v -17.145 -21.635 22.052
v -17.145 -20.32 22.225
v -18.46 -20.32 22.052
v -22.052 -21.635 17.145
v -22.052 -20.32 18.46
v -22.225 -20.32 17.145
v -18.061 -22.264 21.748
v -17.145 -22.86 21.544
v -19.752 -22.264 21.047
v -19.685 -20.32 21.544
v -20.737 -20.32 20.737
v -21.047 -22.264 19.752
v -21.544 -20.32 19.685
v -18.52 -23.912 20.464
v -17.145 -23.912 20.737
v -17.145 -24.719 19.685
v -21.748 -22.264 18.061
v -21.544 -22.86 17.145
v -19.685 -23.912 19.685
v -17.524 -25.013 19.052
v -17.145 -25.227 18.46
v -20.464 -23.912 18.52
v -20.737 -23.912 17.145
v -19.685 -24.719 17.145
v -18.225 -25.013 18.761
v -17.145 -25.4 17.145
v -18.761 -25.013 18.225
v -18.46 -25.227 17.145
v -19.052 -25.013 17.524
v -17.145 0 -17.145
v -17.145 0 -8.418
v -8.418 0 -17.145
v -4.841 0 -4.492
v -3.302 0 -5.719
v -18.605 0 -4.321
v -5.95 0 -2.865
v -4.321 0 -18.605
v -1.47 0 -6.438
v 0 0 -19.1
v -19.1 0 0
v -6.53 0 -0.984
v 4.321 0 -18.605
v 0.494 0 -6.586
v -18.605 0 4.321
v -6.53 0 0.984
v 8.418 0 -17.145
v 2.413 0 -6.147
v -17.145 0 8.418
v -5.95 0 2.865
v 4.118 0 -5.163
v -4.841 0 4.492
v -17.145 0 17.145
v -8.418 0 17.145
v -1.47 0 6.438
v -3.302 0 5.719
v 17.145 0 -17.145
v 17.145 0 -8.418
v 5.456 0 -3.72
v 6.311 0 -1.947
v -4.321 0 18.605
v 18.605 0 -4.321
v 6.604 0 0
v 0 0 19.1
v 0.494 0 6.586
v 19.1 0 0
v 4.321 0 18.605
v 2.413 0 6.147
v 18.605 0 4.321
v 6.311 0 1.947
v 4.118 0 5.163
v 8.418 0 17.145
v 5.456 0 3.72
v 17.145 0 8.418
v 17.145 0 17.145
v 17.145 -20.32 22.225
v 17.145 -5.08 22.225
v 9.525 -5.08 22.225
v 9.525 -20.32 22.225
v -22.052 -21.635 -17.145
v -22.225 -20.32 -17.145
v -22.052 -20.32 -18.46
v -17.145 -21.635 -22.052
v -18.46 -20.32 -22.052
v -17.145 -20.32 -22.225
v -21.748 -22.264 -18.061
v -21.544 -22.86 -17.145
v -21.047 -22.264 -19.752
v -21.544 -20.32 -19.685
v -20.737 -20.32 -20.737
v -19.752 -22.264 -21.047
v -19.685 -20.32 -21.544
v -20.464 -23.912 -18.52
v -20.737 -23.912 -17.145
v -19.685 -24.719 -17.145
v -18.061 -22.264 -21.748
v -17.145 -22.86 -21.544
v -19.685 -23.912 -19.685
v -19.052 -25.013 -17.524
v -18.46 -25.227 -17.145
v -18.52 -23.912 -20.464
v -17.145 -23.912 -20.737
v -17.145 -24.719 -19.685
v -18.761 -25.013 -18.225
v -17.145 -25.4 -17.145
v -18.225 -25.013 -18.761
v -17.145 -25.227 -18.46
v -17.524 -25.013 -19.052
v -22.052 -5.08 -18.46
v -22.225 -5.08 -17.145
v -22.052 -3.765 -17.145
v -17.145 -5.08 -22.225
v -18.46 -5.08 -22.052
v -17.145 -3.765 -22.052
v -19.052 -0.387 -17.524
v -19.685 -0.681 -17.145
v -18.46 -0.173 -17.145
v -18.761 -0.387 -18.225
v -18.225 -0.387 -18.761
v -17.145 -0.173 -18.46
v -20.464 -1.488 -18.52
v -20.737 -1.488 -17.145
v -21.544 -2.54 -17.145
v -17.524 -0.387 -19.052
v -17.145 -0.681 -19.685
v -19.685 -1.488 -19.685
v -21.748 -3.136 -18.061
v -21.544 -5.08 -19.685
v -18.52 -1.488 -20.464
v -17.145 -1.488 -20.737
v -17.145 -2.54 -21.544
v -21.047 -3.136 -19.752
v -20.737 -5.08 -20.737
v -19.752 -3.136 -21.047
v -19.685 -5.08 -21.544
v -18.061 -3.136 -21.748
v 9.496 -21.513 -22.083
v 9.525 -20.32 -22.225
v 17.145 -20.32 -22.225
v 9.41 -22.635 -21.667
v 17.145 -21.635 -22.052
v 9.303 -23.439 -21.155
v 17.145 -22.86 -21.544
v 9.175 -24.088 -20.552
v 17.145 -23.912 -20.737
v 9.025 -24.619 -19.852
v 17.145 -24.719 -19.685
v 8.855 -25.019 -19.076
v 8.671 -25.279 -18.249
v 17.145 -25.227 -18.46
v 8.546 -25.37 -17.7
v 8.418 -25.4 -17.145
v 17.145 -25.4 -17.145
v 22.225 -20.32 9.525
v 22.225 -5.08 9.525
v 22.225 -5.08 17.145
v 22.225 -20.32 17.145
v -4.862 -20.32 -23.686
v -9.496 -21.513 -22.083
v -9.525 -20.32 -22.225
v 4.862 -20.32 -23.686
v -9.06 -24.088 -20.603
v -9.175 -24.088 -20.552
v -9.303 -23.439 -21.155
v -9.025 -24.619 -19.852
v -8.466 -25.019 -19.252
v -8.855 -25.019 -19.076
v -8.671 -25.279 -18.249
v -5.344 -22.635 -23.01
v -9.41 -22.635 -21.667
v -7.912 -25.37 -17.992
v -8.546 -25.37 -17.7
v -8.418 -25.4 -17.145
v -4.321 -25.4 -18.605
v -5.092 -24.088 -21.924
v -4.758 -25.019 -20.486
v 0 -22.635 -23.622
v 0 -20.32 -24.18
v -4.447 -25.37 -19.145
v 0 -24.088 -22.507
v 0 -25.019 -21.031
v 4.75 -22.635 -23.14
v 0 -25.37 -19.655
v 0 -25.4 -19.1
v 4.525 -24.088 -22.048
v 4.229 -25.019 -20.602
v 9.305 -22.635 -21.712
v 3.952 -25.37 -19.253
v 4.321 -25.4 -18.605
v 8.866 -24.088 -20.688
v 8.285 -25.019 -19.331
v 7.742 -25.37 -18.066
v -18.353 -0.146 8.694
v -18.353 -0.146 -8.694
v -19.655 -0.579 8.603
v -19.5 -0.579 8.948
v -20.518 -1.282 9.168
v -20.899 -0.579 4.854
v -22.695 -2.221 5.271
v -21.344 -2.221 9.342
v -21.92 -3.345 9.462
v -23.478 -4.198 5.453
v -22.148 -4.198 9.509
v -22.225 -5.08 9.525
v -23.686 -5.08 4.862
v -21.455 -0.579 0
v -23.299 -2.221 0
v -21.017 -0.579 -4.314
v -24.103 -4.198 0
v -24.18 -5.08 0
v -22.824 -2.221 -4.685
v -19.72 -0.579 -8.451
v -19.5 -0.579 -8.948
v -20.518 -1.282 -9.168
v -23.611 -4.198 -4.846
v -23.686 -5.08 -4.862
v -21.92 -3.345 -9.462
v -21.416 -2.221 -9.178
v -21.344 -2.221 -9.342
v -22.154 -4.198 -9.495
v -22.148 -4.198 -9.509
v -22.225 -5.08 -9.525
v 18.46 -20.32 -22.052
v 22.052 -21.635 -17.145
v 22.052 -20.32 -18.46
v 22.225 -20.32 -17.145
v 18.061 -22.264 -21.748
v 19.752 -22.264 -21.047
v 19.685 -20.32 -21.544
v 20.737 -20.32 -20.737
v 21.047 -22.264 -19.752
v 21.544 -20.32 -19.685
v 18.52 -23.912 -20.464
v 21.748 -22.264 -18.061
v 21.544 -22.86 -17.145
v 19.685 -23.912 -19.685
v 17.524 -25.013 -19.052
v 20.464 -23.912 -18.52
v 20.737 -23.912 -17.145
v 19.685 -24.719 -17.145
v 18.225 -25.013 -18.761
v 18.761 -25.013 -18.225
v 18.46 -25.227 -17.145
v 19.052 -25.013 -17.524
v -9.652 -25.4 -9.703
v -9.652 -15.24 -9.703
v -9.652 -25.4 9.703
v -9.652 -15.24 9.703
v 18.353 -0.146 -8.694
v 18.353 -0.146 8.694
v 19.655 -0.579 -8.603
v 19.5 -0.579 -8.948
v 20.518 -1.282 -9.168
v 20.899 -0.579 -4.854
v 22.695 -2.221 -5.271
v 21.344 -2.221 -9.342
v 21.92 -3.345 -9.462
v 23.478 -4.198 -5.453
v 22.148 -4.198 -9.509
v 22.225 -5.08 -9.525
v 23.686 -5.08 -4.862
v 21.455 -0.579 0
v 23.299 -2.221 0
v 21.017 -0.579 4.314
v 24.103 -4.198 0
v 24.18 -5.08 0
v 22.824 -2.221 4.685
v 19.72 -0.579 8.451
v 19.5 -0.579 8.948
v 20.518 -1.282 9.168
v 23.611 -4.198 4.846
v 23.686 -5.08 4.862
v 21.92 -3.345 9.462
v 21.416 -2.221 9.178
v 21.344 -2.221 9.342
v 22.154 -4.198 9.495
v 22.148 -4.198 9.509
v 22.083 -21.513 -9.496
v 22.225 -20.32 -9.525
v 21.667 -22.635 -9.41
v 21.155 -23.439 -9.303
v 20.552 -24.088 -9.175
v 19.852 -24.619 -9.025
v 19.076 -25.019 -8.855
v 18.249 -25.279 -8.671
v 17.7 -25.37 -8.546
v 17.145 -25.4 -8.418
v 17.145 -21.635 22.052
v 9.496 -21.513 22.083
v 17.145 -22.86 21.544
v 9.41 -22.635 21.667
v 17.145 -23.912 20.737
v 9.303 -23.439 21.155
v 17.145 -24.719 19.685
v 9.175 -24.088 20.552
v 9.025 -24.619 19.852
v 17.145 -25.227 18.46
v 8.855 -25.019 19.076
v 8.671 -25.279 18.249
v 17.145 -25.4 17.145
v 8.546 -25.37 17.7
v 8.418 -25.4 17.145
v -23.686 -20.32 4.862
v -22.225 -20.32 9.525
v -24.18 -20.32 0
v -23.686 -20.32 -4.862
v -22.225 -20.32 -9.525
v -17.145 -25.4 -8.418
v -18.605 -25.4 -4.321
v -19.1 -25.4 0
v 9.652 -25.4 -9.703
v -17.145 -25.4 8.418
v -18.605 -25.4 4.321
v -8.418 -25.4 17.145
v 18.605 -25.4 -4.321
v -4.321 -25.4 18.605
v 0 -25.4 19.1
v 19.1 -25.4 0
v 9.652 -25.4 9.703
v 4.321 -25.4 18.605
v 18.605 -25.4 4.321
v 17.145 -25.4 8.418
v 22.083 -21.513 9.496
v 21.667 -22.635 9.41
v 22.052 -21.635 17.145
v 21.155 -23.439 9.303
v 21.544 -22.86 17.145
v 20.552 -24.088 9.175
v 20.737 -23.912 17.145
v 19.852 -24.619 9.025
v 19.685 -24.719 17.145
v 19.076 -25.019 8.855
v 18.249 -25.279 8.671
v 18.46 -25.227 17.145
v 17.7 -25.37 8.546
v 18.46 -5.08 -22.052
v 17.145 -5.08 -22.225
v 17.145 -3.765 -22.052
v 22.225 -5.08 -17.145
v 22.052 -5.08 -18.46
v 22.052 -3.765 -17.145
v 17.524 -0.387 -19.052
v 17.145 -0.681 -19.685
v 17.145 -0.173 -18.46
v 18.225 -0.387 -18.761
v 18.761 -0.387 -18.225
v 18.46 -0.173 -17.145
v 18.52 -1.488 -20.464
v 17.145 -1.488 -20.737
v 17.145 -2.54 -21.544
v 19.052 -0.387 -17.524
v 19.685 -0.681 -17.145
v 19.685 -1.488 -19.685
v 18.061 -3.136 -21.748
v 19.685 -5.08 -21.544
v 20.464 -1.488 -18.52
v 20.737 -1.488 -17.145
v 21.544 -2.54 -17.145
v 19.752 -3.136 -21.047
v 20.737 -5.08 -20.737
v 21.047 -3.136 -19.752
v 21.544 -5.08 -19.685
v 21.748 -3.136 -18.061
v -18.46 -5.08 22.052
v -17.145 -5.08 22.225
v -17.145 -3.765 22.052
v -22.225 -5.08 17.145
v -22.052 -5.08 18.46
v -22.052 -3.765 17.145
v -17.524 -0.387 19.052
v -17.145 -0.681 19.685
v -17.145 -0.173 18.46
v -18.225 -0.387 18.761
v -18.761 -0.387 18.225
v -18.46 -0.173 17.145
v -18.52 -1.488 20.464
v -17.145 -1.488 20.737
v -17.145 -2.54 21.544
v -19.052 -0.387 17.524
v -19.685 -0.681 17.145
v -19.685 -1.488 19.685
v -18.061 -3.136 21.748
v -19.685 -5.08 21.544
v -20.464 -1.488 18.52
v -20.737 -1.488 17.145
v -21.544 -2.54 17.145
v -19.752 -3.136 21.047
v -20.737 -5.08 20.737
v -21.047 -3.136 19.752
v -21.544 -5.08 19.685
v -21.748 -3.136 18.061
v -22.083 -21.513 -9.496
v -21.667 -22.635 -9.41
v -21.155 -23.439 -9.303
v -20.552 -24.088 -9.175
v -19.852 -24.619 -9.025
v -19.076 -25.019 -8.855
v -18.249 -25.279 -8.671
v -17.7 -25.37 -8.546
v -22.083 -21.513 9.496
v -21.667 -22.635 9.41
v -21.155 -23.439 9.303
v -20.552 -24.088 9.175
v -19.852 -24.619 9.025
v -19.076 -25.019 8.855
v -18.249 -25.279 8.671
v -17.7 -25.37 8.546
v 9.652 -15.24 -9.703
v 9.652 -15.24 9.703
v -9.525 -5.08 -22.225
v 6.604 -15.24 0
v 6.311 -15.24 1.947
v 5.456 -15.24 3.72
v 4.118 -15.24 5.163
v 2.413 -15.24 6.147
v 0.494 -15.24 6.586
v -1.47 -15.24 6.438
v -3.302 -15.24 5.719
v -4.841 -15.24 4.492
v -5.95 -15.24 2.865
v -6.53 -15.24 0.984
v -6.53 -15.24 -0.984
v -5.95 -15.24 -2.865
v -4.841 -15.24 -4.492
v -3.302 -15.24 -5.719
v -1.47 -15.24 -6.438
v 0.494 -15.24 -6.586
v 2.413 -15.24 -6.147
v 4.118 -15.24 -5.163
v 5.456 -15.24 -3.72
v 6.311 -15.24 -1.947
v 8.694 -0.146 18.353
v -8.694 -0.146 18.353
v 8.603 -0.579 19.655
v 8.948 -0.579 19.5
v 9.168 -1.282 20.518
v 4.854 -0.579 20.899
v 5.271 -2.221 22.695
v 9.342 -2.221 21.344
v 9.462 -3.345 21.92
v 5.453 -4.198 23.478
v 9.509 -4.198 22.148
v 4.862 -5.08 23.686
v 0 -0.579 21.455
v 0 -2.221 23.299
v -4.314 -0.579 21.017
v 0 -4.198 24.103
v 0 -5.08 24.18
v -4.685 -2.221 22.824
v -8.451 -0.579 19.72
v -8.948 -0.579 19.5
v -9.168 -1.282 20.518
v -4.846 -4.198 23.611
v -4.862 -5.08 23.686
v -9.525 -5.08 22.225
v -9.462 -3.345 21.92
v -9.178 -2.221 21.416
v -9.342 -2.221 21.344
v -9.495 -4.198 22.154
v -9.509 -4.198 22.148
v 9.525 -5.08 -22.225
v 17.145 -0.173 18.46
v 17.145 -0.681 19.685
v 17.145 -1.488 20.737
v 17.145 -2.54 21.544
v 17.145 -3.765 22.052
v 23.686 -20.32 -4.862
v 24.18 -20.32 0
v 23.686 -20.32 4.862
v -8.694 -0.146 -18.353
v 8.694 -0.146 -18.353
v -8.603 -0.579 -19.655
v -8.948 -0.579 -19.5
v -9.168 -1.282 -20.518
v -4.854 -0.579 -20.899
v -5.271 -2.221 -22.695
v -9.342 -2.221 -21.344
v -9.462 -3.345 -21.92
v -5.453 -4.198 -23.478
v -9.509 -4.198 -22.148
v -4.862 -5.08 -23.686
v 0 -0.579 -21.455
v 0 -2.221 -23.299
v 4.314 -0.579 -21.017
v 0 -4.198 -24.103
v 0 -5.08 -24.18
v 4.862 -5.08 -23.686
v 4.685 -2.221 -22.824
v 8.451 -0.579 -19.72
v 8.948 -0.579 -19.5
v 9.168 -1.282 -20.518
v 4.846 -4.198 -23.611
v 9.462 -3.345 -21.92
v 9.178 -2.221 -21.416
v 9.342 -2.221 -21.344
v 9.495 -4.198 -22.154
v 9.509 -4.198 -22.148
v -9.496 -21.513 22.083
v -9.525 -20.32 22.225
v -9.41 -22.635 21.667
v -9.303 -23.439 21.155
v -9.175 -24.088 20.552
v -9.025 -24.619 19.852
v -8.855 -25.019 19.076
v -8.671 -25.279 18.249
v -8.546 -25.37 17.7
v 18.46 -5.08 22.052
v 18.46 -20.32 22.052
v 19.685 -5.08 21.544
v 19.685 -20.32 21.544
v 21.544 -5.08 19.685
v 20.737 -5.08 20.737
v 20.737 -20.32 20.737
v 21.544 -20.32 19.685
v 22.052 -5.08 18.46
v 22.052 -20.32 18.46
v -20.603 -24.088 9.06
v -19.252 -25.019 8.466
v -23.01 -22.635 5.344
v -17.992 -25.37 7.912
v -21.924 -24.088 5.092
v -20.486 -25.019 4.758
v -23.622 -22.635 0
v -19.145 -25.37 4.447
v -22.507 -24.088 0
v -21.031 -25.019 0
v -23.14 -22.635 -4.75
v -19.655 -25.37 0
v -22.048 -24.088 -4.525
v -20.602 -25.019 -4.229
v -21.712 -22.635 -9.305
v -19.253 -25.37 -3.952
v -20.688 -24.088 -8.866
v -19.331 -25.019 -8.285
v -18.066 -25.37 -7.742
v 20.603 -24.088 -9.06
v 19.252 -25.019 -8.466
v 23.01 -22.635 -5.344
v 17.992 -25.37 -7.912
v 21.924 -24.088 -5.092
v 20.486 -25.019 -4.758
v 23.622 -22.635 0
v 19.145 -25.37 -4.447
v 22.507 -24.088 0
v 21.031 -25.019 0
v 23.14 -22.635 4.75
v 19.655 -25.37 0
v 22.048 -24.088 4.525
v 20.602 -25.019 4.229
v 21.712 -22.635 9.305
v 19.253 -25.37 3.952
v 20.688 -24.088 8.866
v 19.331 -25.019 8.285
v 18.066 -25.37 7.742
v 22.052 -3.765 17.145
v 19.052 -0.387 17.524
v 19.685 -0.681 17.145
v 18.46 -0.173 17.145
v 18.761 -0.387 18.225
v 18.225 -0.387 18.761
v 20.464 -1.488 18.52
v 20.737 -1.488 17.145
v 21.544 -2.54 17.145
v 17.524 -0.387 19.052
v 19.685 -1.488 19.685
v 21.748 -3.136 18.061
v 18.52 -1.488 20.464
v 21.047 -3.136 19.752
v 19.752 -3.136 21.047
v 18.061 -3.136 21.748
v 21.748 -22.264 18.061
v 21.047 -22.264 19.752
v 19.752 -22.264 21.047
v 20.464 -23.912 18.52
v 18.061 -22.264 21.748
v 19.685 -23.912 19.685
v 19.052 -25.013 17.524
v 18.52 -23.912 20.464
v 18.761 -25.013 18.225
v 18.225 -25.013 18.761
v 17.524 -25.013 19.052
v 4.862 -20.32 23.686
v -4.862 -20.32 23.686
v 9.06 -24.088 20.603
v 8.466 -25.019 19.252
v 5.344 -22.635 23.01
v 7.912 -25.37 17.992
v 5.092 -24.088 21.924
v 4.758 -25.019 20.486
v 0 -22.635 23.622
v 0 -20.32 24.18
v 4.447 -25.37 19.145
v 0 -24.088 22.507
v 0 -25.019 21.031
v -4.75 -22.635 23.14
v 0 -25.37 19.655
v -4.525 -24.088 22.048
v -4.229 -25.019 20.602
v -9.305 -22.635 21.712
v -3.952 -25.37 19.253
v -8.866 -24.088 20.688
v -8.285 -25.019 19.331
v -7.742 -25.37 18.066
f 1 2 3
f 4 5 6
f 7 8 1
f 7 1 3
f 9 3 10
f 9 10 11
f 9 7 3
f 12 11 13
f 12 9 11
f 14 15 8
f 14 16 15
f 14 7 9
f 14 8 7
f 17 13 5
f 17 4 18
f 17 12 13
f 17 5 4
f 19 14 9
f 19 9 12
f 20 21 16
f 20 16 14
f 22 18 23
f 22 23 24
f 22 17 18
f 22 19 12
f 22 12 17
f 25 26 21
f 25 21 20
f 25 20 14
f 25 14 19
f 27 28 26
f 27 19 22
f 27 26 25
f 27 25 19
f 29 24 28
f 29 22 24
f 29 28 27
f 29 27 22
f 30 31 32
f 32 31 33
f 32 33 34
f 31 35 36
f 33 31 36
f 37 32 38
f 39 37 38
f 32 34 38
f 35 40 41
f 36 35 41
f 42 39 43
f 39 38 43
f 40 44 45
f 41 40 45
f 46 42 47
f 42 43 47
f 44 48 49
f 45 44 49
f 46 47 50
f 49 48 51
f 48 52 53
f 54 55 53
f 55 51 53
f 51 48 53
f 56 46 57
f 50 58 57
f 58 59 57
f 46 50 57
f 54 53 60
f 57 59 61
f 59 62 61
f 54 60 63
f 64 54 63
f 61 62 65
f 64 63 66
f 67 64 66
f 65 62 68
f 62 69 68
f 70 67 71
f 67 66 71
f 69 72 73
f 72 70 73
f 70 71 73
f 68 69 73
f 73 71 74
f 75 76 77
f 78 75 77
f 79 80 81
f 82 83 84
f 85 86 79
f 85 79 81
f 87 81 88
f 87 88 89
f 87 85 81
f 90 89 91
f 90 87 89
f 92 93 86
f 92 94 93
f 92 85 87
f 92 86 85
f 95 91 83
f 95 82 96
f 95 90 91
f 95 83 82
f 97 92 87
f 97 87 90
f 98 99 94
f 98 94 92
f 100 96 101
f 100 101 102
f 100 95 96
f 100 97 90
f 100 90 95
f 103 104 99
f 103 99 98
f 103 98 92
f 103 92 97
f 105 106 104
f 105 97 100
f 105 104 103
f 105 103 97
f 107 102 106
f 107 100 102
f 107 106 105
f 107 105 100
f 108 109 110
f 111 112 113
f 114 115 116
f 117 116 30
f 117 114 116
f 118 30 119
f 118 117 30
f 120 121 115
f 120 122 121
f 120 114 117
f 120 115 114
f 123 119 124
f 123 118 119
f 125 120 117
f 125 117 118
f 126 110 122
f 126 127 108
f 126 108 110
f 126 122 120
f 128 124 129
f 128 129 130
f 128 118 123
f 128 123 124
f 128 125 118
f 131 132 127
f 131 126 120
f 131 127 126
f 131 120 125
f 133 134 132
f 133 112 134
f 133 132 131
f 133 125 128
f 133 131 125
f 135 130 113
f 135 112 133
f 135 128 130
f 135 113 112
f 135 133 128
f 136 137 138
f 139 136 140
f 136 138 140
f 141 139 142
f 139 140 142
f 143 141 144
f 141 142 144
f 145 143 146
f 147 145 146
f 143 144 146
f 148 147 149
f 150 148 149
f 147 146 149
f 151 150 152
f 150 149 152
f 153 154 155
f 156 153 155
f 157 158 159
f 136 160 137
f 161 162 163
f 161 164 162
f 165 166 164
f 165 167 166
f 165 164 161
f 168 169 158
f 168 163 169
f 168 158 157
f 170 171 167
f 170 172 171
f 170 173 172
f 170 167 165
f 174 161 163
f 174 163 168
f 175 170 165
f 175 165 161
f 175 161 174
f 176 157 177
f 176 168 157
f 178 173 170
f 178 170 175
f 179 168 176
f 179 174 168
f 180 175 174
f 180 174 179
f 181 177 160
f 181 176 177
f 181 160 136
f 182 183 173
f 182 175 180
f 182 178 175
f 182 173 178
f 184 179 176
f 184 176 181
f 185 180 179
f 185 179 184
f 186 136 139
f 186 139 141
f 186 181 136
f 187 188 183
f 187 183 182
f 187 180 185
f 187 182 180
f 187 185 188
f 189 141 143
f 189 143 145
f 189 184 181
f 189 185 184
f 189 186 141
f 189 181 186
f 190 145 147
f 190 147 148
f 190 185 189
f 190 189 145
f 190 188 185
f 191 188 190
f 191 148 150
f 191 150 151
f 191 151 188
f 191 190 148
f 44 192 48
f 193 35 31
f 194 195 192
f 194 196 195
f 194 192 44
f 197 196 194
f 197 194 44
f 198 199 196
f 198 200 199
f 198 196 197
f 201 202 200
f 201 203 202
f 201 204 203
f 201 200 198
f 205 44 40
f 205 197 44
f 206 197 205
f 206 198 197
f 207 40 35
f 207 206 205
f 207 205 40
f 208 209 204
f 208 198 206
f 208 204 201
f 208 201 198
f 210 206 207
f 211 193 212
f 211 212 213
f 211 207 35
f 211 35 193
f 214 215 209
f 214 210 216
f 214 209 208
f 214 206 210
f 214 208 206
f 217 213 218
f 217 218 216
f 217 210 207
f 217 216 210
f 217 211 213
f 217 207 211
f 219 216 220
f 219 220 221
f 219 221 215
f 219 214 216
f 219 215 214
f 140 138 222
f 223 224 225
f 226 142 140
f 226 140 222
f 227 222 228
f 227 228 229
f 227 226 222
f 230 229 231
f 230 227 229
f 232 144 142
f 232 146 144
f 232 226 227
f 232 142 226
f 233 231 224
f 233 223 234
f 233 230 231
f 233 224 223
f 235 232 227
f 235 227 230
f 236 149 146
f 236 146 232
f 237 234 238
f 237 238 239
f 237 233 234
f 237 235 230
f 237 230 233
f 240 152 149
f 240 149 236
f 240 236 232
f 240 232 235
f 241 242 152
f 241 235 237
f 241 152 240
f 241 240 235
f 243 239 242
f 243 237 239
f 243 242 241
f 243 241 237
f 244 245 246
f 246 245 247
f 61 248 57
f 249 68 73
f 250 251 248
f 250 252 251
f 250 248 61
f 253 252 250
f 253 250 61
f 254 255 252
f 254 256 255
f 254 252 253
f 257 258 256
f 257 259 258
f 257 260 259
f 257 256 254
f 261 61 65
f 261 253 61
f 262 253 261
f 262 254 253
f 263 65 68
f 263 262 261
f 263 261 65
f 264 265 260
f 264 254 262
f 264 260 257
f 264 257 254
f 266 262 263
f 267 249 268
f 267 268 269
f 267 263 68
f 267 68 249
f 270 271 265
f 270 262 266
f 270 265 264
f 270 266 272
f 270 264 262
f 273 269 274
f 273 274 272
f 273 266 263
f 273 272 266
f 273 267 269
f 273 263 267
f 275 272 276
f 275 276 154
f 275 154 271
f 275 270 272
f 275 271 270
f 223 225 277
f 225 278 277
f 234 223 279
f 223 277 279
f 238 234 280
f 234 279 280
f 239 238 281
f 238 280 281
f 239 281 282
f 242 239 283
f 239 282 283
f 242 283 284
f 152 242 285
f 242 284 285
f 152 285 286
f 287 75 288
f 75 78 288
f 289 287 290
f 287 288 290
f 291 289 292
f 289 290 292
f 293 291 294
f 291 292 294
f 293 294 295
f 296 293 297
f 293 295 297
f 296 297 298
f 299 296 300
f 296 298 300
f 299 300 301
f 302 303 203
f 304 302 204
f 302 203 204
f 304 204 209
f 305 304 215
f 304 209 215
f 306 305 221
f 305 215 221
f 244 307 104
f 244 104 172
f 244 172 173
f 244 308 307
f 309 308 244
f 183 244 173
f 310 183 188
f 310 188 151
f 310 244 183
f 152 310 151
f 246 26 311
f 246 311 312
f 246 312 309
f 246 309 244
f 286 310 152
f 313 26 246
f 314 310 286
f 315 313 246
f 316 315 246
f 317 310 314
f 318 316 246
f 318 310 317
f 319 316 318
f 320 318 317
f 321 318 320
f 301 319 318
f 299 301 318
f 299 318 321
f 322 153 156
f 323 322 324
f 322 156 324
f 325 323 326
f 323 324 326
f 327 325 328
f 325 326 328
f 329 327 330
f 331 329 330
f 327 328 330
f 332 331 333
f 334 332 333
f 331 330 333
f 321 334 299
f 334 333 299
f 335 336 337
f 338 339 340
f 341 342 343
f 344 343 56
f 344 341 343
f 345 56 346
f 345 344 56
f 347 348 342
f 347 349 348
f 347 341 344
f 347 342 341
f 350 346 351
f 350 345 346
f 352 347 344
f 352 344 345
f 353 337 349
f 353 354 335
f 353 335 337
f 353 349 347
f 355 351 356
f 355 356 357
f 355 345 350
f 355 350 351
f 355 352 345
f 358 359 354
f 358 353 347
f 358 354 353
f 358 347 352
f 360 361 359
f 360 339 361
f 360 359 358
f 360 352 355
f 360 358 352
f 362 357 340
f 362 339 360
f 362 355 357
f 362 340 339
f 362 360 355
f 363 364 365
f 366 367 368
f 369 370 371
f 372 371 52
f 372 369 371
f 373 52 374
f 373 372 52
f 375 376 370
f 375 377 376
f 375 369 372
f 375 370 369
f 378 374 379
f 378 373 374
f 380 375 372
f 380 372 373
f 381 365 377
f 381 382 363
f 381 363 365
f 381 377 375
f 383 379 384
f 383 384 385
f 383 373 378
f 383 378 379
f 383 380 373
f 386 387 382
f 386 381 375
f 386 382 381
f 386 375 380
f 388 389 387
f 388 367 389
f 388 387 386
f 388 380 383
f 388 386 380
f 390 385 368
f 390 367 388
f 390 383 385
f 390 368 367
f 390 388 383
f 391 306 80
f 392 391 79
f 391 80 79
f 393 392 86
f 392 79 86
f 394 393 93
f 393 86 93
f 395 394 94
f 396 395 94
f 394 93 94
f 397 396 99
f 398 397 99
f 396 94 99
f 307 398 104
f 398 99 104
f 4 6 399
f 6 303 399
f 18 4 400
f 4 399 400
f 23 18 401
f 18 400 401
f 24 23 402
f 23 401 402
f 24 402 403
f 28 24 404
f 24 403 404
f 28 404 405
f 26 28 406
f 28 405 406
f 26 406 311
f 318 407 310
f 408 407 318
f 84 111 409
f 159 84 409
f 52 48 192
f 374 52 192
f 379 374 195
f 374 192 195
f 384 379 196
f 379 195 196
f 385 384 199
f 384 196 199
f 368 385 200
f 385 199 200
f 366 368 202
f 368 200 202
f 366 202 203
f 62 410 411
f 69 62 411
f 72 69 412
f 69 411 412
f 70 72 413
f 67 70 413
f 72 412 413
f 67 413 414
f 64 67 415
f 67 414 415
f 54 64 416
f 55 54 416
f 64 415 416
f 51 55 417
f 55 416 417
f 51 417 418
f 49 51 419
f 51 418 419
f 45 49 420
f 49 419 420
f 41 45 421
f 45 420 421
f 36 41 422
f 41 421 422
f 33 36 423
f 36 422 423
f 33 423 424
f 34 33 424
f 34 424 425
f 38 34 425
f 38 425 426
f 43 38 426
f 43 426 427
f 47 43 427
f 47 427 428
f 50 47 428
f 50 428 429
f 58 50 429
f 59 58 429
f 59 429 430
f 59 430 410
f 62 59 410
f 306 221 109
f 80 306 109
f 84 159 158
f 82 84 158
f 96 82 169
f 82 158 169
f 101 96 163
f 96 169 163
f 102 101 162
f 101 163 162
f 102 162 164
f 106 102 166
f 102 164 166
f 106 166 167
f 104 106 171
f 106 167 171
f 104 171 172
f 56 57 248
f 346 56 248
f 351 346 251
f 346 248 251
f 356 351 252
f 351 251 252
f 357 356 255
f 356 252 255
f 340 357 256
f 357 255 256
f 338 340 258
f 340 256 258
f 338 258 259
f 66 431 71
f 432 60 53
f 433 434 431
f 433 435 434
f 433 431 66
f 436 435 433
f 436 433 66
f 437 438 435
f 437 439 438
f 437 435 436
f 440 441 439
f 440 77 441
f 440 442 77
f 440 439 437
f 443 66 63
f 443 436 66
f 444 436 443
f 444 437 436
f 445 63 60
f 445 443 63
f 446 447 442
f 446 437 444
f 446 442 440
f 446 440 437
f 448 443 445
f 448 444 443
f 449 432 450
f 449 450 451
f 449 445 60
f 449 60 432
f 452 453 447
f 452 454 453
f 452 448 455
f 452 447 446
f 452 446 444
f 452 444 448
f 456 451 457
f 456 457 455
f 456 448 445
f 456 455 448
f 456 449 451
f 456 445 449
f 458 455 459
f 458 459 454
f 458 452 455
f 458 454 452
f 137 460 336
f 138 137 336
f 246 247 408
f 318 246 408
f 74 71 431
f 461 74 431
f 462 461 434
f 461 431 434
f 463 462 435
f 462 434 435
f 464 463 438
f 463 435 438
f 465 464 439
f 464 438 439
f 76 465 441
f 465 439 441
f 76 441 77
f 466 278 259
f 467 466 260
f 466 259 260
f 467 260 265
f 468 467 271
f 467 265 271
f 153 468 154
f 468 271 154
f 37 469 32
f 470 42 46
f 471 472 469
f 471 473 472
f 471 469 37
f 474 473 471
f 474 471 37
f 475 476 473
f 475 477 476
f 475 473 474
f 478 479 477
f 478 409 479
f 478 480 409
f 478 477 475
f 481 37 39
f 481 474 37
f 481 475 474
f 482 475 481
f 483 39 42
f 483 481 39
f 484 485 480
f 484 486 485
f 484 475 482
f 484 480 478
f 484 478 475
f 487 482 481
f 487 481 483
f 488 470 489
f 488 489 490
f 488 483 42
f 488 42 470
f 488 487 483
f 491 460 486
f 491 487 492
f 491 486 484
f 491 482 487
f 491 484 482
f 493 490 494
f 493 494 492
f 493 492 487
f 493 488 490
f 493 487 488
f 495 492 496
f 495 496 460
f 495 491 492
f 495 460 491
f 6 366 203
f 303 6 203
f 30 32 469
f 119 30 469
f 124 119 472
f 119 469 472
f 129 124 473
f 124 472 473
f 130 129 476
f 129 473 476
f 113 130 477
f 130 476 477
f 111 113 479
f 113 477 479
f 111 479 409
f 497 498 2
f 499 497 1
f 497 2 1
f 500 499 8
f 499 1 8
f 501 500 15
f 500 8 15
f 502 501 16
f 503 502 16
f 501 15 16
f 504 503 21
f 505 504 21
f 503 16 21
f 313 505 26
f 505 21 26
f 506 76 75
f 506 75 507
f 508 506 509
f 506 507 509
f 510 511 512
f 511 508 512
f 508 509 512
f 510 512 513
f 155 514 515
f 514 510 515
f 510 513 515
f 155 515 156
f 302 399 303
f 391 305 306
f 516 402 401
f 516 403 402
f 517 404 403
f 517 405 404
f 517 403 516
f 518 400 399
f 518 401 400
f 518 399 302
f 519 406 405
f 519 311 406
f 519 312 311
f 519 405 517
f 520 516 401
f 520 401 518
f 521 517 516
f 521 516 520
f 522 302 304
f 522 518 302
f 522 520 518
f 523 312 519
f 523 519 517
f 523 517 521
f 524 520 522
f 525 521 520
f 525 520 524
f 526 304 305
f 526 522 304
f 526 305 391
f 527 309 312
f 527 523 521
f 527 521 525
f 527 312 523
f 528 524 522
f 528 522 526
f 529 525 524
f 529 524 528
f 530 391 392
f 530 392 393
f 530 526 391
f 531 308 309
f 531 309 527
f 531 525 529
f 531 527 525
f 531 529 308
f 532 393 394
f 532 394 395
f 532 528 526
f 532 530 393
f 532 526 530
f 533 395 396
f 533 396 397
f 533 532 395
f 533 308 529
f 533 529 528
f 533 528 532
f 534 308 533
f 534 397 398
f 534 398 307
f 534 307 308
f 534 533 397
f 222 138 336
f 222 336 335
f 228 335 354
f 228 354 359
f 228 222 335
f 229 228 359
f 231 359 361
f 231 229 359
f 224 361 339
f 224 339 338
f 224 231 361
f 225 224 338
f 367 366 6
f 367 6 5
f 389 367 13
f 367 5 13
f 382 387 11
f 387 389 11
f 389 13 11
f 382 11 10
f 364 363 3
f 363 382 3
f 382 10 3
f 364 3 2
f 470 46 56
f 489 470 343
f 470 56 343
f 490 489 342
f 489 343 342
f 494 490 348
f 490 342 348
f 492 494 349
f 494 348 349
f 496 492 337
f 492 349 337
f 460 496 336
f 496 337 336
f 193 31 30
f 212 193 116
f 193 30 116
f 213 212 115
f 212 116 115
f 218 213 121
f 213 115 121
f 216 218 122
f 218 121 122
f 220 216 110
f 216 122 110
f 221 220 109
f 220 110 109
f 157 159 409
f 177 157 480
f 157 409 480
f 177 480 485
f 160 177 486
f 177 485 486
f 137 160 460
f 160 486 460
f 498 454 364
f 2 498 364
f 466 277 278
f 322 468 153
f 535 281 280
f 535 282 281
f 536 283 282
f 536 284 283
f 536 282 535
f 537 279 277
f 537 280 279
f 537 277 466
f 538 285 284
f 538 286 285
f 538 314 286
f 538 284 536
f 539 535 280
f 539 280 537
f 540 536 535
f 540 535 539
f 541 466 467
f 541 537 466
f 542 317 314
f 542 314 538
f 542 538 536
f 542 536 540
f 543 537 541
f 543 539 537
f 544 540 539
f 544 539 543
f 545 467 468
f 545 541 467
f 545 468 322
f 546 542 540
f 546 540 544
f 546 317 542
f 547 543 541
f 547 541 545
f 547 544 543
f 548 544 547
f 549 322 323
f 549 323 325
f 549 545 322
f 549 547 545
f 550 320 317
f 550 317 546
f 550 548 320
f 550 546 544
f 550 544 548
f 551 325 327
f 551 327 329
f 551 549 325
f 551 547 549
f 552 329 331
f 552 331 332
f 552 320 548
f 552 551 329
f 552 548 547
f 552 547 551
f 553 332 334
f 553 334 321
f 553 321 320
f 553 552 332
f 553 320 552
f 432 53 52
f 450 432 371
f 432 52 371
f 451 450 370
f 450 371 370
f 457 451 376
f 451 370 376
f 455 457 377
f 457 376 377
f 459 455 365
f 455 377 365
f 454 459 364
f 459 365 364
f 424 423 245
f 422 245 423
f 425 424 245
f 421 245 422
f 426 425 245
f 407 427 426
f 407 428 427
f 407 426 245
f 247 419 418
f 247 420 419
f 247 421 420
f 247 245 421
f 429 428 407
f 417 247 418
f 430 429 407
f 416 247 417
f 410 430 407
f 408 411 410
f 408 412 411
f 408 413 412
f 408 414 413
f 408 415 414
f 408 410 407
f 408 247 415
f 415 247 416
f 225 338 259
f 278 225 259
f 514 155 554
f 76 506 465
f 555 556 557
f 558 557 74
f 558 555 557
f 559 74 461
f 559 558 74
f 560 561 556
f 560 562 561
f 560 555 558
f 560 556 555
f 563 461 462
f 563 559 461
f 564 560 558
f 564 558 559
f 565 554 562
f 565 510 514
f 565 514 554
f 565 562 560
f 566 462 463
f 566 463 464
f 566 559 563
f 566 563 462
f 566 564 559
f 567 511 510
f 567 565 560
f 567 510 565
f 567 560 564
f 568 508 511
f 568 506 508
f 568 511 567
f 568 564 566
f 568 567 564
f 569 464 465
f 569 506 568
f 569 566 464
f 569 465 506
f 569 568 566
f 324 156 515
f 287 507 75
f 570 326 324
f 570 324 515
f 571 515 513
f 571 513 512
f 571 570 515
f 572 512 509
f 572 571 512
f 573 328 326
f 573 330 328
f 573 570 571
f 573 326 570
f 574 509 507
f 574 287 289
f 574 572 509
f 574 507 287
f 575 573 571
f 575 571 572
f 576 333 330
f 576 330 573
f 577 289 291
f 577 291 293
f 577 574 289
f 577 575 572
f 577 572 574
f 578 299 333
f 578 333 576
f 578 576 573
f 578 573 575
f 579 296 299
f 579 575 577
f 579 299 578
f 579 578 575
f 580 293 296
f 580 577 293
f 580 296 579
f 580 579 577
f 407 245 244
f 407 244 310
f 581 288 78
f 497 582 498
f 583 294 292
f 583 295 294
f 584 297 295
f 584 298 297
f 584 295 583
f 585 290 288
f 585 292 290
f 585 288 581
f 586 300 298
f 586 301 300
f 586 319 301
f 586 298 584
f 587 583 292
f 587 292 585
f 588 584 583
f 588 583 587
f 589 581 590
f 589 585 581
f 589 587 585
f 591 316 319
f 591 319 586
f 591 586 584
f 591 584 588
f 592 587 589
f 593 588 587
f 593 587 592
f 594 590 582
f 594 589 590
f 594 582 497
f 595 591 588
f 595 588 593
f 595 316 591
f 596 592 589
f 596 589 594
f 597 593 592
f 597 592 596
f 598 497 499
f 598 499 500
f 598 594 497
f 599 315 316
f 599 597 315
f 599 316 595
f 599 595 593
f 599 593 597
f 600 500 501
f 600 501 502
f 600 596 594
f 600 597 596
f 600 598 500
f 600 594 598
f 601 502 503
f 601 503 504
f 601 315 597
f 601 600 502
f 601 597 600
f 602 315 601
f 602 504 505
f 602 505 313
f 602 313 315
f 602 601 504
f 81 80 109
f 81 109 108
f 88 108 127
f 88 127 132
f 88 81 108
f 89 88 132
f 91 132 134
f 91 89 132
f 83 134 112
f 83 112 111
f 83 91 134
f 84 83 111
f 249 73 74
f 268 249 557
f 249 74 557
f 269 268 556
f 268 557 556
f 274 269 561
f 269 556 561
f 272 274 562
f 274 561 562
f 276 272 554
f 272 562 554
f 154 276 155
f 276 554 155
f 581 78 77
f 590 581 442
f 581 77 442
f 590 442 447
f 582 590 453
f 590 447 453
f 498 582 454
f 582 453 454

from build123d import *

# Parameters (mm, degrees)
F0_W     = 19.304
F0_H     = 19.4056
F1_DEPTH = 25.4
F2_DEPTH = 15.24
F3_R     = 6.604
F4_DEPTH = 127
F5_R     = 5.08
F6_R     = 5.08


with BuildPart() as f1:
    # F0 (on Front) → F1 (new body)
    with BuildSketch(Plane.XZ):
        with BuildLine():
            Line((-22.225, -9.525), (-22.225, -22.225))
            Line((-22.225, -22.225), (-9.525, -22.225))
            ThreePointArc((-9.525, -22.225), (0, -24.18008), (9.525, -22.225))
            Line((9.525, -22.225), (22.225, -22.225))
            Line((22.225, -22.225), (22.225, -9.525))
            ThreePointArc((22.225, -9.525), (24.18008, 0), (22.225, 9.525))
            Line((22.225, 9.525), (22.225, 22.225))
            Line((22.225, 22.225), (9.525, 22.225))
            ThreePointArc((9.525, 22.225), (0, 24.18008), (-9.525, 22.225))
            Line((-9.525, 22.225), (-22.225, 22.225))
            Line((-22.225, 22.225), (-22.225, 9.525))
            ThreePointArc((-22.225, 9.525), (-24.18008, 0), (-22.225, -9.525))
        make_face()
        Rectangle(F0_W, F0_H, mode=Mode.SUBTRACT)
    extrude(amount=F1_DEPTH)

    # F0 (on Front) → F2 (join)
    with BuildSketch(Plane.XZ):
        Rectangle(F0_W, F0_H)
    extrude(amount=F2_DEPTH)

    # F3 (on face) → F4 (cut)
    with BuildSketch(Plane.XZ.offset(15.24)):
        Circle(F3_R)
    extrude(amount=-F4_DEPTH, mode=Mode.SUBTRACT)

    # F5
    f5_edges = [f1.edges().sort_by_distance(p)[0] for p in [
        (-22.225, -12.7, -22.225),
        (-22.225, -12.7, 22.225),
        (22.225, -12.7, 22.225),
        (22.225, -12.7, -22.225),
    ]]
    fillet(f5_edges, radius=F5_R)

    # F6
    f6_edges = [f1.edges().sort_by_distance(p)[0] for p in [
        (-13.335, -25.4, -22.225),
        (-13.335, 0, -22.225),
        (-13.335, 0, 22.225),
        (-22.225, -25.4, 13.335),
        (22.225, -25.4, 13.335),
        (22.225, -25.4, -13.335),
        (13.335, 0, -22.225),
        (13.335, 0, 22.225),
        (0, -25.4, -24.18008),
        (0, 0, -24.18008),
        (0, 0, 24.18008),
        (0, -25.4, 24.18008),
        (24.18008, -25.4, 0),
        (24.18008, 0, 0),
        (-24.18008, 0, 0),
        (-24.18008, -25.4, 0),
    ]]
    fillet(f6_edges, radius=F6_R)


solid = f1.part
